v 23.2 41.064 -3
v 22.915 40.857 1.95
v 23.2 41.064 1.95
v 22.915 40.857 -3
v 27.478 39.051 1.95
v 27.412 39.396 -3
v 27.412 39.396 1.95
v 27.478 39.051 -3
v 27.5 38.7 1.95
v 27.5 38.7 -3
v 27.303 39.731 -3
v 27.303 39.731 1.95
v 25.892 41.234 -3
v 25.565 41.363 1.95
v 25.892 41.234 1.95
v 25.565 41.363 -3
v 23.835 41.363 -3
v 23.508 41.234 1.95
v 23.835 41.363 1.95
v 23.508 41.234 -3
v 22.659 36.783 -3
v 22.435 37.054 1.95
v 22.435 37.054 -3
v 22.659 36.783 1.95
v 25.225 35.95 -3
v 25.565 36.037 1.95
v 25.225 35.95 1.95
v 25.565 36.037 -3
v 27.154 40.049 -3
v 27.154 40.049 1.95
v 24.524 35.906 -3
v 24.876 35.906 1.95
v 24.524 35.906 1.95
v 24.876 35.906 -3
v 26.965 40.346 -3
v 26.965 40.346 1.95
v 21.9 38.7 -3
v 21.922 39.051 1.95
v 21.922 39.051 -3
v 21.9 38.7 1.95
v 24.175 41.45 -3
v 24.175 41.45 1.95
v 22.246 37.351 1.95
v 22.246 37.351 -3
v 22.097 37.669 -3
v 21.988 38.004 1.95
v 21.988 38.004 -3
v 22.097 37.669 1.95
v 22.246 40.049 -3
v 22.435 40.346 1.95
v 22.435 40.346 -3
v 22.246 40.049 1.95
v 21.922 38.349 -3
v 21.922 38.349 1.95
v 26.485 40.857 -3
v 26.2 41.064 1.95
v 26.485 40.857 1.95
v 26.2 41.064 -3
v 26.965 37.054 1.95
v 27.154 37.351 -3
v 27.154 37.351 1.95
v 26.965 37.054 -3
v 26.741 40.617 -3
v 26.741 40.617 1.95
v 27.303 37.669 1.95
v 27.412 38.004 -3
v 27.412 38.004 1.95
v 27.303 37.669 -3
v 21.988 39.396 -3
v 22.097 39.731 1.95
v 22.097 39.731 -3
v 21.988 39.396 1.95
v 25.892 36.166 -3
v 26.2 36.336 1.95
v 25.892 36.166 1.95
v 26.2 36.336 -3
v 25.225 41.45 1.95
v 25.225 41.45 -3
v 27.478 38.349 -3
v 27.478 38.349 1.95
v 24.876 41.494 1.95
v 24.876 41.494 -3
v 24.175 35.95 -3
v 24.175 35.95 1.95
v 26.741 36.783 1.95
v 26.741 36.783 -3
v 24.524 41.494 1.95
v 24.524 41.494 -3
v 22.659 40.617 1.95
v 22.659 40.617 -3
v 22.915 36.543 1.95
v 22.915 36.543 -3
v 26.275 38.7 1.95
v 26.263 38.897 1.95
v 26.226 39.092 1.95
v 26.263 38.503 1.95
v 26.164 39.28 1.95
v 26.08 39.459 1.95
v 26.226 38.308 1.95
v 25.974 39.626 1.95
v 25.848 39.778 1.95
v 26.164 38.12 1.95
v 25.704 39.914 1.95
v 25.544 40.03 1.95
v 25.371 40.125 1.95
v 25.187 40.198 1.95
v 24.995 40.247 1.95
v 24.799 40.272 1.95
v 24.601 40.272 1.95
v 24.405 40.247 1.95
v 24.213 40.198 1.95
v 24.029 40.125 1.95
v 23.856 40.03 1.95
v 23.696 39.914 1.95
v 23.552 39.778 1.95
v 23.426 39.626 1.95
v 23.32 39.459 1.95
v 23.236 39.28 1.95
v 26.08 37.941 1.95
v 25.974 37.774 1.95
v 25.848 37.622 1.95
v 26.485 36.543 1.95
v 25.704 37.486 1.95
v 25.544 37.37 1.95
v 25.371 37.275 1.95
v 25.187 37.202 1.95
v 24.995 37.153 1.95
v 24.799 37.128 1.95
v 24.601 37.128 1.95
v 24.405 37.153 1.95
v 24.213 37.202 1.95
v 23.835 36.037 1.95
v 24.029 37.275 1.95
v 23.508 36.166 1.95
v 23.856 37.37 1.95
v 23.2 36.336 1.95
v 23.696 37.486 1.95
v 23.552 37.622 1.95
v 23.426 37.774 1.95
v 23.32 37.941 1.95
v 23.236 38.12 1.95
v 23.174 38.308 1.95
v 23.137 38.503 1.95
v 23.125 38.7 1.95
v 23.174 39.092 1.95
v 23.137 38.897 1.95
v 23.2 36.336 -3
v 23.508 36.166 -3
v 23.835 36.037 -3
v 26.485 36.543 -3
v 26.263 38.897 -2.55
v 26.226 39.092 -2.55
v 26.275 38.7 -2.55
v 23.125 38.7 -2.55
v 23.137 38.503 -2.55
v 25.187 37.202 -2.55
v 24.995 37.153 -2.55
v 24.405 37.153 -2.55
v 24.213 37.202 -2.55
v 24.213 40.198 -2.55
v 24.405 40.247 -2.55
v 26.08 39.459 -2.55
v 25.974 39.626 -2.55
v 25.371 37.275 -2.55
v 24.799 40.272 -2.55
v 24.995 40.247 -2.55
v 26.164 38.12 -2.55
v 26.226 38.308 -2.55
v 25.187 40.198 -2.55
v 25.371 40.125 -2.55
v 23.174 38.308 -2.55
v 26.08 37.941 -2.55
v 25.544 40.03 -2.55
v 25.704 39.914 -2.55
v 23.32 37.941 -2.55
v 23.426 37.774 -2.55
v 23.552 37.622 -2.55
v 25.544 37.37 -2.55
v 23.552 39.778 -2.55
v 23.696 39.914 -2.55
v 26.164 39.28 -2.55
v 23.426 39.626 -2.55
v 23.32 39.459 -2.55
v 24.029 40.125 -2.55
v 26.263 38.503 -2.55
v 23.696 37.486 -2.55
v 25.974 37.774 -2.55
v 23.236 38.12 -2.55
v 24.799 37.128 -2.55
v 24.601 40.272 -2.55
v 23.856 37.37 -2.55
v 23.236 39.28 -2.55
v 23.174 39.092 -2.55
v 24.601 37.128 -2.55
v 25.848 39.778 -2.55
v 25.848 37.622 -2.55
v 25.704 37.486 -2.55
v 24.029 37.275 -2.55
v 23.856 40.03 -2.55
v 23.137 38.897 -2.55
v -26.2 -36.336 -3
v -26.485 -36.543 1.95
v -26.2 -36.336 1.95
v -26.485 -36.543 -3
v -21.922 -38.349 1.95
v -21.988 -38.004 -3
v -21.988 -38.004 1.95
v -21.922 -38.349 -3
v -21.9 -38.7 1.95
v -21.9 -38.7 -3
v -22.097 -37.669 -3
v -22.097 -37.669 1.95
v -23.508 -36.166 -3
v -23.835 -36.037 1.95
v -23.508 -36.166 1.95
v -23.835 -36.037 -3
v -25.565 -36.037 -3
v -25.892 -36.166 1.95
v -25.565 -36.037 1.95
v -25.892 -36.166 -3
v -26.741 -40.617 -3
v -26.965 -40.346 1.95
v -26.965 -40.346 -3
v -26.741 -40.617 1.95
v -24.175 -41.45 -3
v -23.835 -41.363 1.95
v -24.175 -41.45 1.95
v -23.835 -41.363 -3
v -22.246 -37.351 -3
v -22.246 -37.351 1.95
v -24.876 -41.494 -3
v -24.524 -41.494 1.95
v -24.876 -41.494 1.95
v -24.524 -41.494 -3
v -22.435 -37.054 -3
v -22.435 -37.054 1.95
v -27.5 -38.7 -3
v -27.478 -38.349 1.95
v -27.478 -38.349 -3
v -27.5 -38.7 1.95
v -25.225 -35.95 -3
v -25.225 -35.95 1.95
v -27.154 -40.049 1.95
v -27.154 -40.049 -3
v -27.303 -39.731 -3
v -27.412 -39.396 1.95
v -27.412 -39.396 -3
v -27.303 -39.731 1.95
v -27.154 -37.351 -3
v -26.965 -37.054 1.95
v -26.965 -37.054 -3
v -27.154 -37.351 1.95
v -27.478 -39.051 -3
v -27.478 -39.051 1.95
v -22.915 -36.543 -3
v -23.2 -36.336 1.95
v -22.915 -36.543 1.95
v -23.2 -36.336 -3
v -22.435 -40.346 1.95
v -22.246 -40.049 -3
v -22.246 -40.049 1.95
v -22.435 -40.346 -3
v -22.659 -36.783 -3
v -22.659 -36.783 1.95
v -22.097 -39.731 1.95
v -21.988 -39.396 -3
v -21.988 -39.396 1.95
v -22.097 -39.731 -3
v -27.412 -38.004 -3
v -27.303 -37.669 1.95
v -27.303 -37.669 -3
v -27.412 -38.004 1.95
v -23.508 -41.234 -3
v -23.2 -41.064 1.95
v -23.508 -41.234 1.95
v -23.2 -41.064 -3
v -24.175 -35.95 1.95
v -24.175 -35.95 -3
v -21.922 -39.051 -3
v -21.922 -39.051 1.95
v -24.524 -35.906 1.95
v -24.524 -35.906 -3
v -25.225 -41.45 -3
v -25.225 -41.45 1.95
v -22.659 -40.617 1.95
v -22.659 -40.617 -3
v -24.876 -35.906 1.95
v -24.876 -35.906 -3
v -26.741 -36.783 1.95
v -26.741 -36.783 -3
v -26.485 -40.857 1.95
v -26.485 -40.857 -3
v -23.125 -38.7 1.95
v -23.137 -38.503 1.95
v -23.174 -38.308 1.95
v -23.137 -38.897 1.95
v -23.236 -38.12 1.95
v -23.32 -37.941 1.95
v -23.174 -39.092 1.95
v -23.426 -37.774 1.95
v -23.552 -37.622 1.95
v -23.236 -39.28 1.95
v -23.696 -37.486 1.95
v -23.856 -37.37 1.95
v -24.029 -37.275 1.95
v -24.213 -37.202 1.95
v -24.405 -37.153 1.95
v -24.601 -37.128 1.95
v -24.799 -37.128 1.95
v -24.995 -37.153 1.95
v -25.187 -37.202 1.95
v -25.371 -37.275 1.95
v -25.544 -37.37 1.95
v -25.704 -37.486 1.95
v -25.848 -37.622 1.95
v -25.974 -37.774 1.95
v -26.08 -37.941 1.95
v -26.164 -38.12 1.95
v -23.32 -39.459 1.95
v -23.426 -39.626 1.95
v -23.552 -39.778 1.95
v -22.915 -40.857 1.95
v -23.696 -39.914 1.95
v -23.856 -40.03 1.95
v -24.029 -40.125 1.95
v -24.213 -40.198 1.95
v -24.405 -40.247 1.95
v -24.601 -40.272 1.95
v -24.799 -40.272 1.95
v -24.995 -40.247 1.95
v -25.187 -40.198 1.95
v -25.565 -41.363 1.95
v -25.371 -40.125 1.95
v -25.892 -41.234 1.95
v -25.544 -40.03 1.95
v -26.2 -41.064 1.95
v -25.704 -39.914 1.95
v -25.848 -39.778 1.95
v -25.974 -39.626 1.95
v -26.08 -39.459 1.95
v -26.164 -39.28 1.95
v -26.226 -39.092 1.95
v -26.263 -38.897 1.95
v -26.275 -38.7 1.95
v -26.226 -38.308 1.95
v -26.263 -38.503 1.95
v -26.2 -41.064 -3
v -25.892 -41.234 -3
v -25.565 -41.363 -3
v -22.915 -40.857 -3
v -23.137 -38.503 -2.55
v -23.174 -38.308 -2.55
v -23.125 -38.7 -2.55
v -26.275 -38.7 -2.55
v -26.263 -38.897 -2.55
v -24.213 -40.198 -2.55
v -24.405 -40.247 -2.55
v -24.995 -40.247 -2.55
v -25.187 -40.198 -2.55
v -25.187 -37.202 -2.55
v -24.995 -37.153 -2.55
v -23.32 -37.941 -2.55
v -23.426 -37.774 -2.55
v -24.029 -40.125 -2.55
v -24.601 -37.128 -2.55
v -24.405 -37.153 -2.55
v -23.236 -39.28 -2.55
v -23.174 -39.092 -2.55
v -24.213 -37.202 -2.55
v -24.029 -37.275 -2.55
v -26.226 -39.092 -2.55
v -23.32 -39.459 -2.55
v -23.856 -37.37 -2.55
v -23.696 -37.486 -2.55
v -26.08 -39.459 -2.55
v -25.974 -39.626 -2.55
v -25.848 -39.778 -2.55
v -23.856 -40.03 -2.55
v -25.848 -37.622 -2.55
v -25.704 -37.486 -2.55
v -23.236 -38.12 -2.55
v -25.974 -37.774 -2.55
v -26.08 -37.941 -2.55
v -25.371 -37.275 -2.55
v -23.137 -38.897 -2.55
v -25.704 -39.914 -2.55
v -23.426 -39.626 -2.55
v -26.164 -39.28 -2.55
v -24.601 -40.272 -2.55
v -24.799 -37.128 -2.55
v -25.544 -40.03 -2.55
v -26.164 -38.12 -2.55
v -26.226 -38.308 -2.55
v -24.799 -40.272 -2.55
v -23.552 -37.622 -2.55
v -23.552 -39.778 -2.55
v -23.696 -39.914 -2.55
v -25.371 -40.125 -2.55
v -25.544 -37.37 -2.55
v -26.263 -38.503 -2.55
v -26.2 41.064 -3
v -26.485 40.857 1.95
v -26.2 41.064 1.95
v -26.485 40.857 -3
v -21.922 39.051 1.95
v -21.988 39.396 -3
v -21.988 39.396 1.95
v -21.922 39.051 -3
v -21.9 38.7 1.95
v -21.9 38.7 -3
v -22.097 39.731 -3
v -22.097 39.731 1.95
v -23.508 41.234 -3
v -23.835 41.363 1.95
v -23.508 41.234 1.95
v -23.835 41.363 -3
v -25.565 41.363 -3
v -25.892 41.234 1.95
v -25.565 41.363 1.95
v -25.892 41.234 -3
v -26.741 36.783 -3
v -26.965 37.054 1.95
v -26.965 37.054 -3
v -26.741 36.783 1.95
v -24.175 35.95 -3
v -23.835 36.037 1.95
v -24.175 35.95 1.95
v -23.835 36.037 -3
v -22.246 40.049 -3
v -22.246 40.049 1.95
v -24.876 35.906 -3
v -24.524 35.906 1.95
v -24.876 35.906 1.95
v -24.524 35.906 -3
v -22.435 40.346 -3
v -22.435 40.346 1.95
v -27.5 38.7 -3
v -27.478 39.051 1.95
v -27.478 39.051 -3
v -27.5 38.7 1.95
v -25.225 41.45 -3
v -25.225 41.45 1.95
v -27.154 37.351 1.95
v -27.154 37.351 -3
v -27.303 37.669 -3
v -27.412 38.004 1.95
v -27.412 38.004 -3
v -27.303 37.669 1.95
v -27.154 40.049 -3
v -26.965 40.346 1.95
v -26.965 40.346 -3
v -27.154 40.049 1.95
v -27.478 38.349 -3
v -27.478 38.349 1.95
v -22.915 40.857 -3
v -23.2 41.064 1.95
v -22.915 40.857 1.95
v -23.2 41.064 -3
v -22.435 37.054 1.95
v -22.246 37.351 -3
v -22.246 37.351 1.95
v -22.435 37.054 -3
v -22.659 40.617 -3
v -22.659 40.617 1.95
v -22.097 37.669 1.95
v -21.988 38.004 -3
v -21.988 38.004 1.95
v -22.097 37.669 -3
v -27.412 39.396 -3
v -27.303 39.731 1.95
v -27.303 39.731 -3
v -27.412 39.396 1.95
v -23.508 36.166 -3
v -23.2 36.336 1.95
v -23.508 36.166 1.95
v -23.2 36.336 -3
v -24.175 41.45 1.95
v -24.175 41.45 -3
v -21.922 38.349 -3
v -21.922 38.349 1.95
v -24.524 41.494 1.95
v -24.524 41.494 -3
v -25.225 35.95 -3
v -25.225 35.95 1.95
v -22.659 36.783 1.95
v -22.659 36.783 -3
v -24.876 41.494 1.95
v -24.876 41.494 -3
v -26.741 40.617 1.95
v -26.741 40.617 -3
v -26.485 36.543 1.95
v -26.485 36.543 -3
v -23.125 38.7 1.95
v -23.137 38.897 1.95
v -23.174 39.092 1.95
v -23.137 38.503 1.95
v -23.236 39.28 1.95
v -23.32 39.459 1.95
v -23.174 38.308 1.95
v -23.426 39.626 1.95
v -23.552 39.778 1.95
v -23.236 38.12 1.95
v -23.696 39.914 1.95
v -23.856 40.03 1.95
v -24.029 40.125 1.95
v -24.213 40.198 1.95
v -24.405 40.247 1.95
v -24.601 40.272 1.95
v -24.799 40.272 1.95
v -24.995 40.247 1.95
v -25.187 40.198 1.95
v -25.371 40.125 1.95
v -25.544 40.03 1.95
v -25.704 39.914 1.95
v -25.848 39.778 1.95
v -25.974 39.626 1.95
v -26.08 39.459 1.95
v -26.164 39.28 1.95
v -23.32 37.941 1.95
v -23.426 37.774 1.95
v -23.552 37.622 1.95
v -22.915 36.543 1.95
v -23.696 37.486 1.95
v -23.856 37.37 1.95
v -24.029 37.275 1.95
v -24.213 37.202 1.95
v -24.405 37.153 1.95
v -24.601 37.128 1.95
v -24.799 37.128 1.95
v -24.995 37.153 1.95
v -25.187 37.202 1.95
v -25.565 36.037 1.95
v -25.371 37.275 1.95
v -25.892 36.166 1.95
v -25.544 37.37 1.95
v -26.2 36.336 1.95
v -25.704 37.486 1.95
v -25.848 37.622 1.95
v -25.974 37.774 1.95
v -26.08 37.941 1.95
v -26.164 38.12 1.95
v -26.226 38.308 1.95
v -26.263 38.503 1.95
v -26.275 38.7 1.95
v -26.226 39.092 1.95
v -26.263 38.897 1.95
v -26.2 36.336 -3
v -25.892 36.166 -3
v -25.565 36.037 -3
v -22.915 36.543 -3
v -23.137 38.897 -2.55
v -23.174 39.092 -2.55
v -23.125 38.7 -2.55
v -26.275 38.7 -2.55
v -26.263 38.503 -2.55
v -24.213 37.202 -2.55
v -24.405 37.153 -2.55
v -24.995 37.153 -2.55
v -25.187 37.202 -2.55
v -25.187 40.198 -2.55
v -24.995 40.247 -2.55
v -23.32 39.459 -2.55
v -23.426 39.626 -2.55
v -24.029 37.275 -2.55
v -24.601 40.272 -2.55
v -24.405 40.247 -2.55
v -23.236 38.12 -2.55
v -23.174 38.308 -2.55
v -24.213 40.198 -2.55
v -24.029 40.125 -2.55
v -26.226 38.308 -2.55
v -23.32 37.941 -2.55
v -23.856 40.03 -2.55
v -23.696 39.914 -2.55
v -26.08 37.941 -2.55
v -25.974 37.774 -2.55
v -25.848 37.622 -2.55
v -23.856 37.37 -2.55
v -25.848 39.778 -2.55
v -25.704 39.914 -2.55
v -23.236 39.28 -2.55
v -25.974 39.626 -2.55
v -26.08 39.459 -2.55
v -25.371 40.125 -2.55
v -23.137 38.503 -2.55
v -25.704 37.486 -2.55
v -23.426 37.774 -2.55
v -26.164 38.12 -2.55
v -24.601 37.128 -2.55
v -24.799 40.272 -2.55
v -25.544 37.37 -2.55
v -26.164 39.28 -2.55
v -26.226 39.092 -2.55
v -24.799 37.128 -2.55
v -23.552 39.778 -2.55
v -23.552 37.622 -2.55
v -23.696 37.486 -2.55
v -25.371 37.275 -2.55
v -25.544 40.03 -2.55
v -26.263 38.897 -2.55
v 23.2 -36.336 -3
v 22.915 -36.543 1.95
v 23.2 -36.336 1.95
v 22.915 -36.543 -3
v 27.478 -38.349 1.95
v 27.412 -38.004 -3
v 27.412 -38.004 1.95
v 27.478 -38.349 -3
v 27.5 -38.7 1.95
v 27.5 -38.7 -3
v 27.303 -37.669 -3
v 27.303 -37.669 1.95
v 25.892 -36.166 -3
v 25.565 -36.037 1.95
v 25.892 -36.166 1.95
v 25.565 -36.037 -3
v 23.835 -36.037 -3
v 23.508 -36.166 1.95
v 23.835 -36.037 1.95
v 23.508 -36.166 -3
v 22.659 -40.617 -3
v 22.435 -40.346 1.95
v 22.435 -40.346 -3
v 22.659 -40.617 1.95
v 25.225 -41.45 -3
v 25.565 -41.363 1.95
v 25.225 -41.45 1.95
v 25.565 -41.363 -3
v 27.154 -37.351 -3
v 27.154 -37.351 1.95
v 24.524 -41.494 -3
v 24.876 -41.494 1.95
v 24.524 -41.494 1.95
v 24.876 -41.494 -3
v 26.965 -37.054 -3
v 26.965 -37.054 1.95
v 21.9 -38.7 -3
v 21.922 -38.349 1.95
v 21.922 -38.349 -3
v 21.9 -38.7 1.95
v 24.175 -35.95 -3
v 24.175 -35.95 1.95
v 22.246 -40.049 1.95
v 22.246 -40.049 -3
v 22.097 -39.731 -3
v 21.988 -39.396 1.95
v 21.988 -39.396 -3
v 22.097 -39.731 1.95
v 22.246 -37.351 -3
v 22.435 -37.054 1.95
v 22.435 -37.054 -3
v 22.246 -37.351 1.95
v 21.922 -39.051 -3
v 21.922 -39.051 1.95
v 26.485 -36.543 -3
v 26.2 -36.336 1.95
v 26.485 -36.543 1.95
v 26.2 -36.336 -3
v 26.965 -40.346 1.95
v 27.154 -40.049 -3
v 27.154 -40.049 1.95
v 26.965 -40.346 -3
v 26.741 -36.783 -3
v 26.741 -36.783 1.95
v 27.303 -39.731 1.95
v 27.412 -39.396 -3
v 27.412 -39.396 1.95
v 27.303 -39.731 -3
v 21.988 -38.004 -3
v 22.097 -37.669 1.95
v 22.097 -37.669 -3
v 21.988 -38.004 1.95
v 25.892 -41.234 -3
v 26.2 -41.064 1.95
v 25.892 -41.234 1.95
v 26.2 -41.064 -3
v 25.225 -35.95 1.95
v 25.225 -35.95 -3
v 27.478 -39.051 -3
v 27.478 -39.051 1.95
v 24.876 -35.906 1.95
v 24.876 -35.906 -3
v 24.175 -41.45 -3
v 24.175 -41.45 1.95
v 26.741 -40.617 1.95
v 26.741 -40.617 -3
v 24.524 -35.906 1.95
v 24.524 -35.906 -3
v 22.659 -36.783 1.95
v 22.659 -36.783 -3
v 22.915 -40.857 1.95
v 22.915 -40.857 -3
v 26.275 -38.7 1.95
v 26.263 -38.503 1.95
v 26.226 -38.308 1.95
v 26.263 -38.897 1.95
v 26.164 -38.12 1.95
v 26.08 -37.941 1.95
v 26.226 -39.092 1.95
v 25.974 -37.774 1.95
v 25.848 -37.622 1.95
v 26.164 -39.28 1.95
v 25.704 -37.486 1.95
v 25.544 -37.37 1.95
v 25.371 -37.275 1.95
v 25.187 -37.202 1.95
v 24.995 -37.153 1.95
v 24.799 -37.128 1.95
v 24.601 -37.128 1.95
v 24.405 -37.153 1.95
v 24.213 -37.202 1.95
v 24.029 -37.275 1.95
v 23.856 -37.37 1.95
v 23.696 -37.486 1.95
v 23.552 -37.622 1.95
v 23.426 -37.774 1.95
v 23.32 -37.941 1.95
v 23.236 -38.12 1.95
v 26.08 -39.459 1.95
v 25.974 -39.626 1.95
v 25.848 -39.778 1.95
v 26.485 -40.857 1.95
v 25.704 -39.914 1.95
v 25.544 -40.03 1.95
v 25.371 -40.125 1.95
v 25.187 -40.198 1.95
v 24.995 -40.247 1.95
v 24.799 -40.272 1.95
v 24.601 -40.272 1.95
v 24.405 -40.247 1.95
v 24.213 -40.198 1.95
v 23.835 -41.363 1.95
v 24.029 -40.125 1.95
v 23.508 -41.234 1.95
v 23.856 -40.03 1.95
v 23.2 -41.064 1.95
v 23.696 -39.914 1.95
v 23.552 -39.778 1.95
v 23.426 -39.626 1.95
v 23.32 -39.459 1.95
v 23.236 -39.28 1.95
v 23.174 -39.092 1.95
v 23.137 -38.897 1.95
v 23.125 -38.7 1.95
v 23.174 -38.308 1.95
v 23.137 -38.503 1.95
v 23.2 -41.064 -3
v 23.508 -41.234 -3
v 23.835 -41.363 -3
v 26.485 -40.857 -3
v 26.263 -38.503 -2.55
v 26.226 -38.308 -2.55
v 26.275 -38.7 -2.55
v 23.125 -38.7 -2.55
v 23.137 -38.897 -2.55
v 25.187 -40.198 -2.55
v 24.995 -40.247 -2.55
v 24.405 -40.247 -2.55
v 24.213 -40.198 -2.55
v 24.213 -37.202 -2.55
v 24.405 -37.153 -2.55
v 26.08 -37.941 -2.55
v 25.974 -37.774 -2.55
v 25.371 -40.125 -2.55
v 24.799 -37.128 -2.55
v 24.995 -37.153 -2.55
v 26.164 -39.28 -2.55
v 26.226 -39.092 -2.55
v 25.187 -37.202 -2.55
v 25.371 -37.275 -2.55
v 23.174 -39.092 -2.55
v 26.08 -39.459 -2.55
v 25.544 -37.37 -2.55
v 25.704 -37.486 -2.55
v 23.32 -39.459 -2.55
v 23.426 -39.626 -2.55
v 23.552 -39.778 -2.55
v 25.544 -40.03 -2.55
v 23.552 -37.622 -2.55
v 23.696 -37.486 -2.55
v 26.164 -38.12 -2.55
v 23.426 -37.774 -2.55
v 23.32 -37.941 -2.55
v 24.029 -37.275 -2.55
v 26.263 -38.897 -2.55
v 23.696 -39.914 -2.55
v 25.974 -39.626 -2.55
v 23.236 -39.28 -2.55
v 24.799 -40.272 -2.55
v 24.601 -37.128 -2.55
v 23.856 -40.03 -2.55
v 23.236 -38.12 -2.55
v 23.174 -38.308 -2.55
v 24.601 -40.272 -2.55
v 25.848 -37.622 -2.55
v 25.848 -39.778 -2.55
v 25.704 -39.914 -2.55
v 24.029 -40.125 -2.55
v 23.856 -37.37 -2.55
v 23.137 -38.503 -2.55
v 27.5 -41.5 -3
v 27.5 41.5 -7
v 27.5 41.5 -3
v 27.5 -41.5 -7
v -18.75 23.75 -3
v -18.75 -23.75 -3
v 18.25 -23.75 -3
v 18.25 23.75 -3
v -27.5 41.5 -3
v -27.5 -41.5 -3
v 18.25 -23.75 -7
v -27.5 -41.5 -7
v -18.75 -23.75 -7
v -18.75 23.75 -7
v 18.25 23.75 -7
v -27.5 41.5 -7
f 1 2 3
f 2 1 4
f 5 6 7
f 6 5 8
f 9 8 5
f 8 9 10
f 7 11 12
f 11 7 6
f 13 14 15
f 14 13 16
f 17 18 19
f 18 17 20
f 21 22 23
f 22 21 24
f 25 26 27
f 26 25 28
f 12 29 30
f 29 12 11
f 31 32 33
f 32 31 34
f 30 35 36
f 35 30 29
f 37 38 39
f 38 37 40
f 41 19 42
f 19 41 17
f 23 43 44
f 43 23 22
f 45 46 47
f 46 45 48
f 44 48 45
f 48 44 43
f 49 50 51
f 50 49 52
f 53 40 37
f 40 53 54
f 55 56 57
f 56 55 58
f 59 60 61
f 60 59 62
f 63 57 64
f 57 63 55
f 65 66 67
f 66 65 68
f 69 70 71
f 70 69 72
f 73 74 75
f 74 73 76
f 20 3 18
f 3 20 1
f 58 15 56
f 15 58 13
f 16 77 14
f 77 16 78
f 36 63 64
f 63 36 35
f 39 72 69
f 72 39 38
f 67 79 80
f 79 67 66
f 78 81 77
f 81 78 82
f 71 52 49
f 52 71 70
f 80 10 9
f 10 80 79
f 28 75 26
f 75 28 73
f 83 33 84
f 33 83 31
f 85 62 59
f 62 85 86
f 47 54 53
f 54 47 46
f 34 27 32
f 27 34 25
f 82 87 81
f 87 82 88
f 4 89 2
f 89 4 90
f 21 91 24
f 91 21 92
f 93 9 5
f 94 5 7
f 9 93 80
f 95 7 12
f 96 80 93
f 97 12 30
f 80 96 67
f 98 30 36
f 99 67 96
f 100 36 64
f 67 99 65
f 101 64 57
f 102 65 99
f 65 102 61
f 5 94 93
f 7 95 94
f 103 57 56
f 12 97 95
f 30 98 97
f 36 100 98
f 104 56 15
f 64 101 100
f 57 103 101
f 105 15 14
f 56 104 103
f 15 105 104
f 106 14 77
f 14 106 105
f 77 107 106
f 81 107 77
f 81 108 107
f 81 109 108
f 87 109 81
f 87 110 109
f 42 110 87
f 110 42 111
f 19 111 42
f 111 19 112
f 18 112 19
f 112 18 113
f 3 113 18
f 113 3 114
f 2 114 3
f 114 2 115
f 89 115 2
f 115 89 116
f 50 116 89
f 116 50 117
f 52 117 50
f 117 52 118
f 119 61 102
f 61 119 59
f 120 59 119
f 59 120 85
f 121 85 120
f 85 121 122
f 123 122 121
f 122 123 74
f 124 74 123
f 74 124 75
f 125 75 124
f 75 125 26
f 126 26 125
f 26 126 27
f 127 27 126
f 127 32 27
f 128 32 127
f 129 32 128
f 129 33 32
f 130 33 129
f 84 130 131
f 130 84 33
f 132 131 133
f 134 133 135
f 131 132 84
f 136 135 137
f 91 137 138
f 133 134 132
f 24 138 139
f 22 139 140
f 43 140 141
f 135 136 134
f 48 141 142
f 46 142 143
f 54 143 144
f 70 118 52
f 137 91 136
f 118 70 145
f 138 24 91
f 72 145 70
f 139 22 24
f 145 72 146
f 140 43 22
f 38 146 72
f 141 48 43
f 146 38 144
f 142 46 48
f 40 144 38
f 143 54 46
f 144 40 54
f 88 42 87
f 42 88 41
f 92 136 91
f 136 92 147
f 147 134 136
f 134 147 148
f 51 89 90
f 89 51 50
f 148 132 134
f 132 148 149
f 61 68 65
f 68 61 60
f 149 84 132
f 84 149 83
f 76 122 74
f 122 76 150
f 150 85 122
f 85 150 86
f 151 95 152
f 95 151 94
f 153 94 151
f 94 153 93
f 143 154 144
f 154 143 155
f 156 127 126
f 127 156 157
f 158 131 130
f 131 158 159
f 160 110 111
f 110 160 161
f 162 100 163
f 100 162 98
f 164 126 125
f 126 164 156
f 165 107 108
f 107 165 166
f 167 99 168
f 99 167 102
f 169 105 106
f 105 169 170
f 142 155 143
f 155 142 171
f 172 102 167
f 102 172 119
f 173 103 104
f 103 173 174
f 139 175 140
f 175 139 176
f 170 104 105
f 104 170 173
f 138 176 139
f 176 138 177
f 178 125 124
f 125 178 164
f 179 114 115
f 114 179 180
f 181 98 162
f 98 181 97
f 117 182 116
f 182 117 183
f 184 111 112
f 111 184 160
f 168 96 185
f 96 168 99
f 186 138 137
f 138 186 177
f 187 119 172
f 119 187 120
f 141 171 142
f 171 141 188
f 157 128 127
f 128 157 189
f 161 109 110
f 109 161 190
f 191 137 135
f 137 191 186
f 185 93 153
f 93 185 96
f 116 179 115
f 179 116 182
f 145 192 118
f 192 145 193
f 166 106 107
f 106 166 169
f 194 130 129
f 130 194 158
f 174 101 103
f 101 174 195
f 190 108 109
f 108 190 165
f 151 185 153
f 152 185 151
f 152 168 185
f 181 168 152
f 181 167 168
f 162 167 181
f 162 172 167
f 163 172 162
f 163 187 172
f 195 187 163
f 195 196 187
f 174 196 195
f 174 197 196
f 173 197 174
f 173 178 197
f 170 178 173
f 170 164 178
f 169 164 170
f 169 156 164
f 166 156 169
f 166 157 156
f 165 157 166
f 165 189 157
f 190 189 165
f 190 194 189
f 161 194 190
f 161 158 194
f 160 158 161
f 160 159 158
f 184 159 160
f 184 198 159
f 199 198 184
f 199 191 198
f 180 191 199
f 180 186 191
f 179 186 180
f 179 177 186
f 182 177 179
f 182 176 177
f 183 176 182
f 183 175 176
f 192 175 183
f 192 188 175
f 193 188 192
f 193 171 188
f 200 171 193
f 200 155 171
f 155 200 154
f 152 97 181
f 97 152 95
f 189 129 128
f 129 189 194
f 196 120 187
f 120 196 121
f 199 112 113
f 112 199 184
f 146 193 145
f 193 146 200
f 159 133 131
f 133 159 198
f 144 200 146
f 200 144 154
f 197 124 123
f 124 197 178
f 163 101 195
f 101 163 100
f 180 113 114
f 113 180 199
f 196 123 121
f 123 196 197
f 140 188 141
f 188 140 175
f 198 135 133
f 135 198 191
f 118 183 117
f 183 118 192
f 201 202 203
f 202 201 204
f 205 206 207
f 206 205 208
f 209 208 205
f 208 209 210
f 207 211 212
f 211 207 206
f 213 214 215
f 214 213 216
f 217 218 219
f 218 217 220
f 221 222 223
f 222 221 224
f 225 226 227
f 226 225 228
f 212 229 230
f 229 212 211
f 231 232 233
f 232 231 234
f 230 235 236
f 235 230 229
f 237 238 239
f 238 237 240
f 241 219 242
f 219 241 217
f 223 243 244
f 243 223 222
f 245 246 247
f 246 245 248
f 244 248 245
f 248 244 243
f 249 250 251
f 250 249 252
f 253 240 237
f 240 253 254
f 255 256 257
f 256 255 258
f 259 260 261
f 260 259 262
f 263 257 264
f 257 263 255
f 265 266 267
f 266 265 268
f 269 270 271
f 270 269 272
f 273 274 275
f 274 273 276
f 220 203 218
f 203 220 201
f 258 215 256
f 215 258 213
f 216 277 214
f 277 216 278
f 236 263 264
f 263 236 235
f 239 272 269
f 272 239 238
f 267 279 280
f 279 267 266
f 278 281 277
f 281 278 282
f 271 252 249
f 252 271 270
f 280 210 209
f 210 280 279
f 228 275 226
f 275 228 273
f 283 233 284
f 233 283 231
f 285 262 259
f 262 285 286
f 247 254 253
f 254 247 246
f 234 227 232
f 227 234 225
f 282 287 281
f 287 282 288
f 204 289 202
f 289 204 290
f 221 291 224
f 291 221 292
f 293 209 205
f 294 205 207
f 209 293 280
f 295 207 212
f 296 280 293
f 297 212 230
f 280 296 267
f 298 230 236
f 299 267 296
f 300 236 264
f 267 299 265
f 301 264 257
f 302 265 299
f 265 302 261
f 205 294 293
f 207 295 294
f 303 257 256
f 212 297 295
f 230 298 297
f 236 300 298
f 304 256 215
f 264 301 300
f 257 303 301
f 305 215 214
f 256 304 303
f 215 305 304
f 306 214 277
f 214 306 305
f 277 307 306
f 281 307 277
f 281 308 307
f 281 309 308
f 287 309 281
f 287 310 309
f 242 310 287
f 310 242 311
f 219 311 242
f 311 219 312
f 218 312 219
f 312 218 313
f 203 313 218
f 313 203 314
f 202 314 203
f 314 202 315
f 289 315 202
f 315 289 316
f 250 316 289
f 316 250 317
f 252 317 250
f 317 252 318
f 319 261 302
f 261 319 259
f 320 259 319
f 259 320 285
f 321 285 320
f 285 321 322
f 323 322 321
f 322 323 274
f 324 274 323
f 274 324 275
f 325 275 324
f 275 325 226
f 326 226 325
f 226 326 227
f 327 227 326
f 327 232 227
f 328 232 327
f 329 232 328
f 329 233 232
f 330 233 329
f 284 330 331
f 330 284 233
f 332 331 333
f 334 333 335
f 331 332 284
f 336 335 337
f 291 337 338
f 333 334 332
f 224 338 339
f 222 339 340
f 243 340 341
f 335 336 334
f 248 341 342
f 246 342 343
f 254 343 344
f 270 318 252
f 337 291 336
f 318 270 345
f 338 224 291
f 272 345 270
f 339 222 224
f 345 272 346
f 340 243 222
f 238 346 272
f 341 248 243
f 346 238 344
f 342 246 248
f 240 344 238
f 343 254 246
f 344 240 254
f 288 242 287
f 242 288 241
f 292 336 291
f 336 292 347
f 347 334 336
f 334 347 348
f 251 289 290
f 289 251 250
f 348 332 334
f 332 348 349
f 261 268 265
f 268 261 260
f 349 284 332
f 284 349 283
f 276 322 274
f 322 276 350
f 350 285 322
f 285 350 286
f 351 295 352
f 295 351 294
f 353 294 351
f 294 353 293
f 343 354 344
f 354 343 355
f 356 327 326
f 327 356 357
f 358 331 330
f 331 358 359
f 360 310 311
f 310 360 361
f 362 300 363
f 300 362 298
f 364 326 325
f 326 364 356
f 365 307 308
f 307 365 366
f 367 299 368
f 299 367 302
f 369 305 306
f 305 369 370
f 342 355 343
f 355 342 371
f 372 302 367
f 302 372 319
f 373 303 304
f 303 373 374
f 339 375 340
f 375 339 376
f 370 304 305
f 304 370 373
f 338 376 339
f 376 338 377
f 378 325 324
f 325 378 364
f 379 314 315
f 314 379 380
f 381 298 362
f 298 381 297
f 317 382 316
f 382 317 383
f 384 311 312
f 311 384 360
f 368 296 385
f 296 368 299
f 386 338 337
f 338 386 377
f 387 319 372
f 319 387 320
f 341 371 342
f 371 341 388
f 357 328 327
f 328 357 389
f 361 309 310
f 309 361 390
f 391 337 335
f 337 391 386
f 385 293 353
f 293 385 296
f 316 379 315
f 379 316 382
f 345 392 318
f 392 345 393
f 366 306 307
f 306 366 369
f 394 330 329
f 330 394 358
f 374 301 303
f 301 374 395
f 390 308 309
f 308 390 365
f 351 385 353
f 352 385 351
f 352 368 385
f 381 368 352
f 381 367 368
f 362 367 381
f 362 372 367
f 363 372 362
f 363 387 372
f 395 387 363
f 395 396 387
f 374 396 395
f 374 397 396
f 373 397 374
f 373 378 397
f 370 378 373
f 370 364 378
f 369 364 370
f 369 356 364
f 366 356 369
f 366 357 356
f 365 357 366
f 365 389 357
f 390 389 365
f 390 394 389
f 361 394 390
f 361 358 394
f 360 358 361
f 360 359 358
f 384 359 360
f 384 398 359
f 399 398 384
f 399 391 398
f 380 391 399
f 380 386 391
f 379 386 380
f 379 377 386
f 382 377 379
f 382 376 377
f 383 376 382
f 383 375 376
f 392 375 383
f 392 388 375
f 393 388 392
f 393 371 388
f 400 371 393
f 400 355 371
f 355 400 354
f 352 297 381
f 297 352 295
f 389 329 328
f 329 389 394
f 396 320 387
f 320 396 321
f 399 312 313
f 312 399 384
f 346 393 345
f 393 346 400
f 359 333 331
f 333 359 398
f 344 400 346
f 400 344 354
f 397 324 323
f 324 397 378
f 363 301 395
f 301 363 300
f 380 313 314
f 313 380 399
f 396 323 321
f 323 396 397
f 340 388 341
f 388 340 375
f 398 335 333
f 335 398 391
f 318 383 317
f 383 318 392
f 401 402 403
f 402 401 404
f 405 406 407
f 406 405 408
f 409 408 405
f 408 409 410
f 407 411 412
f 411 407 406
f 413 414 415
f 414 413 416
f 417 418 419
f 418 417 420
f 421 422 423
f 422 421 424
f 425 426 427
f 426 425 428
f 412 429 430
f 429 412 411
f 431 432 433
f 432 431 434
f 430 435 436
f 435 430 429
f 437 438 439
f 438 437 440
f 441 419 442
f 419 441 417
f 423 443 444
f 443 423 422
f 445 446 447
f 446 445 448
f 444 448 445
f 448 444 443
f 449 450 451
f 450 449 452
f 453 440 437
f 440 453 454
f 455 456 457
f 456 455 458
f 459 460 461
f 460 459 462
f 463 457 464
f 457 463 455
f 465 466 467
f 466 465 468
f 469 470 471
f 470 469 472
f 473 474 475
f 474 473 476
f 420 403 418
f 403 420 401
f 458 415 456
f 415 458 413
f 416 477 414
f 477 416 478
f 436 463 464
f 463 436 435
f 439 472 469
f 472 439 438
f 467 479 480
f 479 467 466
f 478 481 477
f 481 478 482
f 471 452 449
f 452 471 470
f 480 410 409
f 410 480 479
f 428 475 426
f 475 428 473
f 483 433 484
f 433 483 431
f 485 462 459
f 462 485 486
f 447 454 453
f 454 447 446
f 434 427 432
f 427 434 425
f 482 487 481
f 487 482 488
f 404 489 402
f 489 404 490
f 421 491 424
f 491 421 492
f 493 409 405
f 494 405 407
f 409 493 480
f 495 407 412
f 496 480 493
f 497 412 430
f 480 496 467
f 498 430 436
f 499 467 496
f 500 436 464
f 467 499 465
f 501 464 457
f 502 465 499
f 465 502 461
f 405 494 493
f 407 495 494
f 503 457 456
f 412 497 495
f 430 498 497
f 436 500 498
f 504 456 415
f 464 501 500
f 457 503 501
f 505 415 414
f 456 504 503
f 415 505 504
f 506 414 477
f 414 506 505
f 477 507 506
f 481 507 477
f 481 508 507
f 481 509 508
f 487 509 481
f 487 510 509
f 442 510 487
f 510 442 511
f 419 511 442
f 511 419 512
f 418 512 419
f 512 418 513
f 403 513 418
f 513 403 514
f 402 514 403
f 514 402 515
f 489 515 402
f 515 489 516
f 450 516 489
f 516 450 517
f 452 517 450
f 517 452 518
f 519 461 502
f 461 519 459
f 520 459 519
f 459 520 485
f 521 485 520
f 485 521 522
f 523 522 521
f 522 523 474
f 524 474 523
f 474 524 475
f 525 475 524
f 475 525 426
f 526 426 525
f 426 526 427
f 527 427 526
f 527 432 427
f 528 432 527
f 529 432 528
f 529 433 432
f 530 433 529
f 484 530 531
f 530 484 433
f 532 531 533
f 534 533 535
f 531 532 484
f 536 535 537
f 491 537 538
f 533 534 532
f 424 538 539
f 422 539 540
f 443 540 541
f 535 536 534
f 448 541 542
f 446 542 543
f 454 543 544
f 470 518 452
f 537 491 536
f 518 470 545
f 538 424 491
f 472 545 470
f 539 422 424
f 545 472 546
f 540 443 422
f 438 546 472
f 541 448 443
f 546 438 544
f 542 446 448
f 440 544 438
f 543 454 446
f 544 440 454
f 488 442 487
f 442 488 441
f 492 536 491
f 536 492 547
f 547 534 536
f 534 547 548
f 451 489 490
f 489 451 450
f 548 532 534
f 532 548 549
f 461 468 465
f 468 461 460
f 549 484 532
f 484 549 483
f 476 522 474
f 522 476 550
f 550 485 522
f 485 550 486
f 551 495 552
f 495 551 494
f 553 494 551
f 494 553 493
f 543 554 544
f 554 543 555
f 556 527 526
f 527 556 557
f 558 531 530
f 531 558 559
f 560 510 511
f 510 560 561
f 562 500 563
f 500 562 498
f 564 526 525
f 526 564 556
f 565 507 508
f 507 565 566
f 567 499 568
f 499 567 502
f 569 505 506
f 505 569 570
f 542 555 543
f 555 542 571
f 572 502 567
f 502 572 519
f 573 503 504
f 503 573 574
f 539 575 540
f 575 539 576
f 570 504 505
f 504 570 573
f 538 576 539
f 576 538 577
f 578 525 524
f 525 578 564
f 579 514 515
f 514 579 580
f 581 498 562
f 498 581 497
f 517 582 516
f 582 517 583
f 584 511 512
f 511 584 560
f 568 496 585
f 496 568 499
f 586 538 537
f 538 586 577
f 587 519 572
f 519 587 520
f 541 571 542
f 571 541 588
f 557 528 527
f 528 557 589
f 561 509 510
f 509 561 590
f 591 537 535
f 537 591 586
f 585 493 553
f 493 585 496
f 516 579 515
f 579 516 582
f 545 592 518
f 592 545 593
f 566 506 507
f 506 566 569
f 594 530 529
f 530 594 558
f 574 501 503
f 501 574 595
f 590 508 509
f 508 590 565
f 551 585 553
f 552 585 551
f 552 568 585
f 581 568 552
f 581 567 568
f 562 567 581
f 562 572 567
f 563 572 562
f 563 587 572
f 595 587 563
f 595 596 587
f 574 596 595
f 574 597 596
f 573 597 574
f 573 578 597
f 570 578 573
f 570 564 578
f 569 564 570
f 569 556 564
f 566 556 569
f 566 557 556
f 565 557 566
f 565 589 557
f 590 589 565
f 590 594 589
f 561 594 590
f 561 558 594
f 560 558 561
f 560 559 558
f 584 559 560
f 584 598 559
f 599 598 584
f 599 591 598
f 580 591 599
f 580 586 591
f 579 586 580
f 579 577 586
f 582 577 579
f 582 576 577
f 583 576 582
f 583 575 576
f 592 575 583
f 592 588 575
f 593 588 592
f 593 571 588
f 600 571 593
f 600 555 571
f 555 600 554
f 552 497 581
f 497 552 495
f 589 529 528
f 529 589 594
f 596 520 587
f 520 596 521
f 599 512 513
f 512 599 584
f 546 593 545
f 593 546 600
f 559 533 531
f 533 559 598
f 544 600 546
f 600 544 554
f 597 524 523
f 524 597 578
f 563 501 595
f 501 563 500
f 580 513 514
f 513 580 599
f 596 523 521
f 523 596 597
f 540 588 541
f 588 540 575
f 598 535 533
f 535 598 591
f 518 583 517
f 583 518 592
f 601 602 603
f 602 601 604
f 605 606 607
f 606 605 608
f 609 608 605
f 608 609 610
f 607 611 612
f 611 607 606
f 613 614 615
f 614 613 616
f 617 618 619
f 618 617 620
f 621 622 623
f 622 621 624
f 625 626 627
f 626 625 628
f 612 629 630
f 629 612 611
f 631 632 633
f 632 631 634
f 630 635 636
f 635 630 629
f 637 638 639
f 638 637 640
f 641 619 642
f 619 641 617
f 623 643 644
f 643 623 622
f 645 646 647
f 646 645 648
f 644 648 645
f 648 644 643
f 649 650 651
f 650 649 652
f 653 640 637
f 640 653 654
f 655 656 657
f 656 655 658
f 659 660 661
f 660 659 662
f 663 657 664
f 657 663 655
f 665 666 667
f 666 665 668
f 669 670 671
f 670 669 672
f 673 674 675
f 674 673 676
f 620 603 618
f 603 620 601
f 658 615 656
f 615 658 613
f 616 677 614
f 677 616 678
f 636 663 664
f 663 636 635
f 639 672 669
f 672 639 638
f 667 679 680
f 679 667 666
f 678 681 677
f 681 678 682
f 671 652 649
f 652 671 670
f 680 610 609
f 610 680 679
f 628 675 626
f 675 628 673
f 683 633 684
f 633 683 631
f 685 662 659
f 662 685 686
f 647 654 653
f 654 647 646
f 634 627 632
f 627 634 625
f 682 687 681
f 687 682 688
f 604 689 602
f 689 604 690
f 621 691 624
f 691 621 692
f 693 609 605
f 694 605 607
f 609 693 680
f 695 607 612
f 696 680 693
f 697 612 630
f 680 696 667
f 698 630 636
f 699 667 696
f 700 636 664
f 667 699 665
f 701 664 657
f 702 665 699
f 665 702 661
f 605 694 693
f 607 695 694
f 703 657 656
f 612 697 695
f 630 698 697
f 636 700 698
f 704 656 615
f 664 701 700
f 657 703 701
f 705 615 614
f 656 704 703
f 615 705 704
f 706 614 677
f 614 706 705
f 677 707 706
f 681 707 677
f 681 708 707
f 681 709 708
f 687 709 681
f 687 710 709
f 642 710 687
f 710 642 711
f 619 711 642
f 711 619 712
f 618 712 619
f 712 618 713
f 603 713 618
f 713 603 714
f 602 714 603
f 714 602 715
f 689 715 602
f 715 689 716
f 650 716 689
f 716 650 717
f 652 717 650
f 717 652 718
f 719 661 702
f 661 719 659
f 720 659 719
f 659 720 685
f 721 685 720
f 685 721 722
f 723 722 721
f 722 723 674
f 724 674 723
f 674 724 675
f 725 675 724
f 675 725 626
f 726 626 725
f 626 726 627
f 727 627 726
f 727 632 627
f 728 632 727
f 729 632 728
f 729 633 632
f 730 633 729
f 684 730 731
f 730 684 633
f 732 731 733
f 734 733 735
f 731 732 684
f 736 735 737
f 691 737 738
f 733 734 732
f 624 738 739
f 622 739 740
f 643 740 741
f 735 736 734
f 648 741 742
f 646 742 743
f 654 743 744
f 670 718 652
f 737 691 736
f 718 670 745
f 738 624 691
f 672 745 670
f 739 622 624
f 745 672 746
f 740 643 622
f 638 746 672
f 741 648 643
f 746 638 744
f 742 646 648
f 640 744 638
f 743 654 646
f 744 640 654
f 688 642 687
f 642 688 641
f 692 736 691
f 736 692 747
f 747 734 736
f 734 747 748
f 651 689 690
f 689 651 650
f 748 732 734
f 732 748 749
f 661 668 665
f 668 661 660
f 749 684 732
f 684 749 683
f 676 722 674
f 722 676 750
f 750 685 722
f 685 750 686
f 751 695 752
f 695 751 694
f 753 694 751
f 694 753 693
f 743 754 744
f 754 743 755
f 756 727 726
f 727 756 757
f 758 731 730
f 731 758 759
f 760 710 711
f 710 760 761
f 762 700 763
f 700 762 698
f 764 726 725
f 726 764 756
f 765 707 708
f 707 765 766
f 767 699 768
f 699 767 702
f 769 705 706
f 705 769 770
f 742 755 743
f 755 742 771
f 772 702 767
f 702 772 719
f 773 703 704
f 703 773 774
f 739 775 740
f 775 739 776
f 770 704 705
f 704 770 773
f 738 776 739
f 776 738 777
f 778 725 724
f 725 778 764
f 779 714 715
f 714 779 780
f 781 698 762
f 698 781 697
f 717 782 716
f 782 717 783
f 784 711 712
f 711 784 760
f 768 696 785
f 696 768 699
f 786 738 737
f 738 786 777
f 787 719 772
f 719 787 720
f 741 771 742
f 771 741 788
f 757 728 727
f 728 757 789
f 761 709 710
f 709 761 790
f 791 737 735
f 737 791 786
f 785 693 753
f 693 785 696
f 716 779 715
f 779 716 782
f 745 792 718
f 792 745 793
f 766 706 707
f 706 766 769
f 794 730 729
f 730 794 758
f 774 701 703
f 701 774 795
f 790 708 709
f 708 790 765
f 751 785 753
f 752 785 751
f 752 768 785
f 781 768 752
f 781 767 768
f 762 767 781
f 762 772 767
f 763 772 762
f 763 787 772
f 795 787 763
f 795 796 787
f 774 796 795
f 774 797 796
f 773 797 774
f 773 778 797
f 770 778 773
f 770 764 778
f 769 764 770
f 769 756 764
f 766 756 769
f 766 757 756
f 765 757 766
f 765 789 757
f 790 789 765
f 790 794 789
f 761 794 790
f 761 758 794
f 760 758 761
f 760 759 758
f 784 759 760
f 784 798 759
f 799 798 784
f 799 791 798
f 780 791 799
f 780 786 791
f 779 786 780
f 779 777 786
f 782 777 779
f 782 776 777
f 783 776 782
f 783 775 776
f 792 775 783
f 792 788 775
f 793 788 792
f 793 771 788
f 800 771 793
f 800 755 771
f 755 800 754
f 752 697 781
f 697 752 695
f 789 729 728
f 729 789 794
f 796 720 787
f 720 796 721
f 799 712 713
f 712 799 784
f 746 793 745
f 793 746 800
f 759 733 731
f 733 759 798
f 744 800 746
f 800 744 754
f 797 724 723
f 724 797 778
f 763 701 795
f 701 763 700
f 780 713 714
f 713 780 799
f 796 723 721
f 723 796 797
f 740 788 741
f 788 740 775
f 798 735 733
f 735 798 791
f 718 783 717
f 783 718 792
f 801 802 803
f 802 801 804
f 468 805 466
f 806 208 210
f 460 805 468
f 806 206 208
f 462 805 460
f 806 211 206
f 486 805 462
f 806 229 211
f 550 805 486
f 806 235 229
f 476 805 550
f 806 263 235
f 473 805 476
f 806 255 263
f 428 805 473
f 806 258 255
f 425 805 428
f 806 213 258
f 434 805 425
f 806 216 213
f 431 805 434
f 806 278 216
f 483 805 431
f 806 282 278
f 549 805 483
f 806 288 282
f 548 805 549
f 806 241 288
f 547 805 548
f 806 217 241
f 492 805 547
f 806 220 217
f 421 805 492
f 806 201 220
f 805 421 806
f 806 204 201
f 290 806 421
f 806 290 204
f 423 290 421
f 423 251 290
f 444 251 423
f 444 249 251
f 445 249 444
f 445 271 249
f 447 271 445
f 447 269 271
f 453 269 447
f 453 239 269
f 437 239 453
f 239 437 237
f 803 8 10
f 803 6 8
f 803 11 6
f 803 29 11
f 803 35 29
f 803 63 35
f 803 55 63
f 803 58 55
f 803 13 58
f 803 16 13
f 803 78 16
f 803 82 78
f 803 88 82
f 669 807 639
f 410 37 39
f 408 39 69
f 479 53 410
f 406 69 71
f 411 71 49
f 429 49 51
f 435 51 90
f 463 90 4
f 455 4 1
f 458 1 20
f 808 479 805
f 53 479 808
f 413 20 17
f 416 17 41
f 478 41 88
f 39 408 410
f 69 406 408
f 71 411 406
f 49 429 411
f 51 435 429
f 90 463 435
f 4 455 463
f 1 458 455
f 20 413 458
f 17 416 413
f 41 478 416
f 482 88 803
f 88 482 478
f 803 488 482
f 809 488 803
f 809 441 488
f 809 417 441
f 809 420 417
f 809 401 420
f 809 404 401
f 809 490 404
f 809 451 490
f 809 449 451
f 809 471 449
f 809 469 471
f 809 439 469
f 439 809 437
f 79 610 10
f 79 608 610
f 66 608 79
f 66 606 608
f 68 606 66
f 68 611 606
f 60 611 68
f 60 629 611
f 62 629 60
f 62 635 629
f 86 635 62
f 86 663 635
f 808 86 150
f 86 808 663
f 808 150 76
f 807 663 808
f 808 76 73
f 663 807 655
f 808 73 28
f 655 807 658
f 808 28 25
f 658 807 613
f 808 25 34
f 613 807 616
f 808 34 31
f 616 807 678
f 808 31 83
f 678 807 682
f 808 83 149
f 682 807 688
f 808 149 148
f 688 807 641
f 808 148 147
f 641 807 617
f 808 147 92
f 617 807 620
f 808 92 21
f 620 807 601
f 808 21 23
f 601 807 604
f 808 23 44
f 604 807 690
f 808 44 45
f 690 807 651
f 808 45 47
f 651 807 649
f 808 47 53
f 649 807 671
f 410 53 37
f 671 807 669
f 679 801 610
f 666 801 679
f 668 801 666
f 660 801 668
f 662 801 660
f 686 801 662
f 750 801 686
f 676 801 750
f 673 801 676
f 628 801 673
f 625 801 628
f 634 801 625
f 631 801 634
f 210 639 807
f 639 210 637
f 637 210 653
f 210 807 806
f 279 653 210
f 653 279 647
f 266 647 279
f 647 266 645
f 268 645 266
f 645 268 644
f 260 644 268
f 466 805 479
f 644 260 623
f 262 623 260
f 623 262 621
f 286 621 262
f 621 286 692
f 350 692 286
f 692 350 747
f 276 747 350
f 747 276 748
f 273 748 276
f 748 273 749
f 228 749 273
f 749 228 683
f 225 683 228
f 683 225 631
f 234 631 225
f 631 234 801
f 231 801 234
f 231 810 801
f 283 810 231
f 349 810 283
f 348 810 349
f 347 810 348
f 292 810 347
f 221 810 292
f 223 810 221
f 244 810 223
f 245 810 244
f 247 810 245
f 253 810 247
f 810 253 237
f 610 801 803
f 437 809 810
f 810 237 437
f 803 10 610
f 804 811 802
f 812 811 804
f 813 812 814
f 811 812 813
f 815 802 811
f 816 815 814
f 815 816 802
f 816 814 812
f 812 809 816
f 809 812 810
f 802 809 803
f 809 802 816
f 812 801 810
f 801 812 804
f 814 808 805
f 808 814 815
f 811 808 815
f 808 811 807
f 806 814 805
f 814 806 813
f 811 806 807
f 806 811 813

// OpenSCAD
// file: ../robot_settings.scad
main_box_x = 95; // 96
main_box_y = 102;
main_box_z = 74; // 74.5
wall_thickness = 2;

rail_gap = 2;
rail_inset = 7;

rail_thickness = 7;
rail_length = 250;
rail_width = 200;

raspberry_pi_screw_seperation_y = 57;
raspberry_pi_screw_seperation_z = 48;
raspberry_pi_peg_h = 5;

gears_module = 1;
pinion_gear_teeth = 30;
pinion_gear_width = 5;
pinion_gear_bore = 4;

gears_setback_distance = 25;
gear_post_height = 2 * pinion_gear_width + rail_thickness + 8 ;

steering_motor_mount_x = 45;
steering_motor_mount_y = 36;
steering_motor_mount_z = 18;
steering_motor_mount_setback_distance = gears_setback_distance + 16;

dc_motor_drivertype = "Teyleten"; // Teyleten
isAdafruit = (dc_motor_drivertype == "Adafruit");

drv8871_x = isAdafruit ? 20.3 : 21.6;
drv8871_y = isAdafruit ?  24 : 25;

drv8871_z = 2;
drv8871_screw_d = 2.5;
drv8871_solder_points_z = 2;

drv8871mount_edge_x = 1.5;
drv8871mount_edge_wall = 3;
drv8871mount_z = 5;
drv8871mount_x = drv8871_x +  drv8871mount_edge_wall - 2* drv8871mount_edge_x;
drv8871mount_y = 19;

drv8871_screw_distance = 15.64;
drv8871_solder_points_d = 1.66;
drv8871_solder_offset_y = 4.4;
drv8871_solder_inner_points_distance = 5;
drv8871_solder_outer_points_distance = 12;

dc_motor_housing_minus_encoder_z = 48;
dc_motor_encoder_z = 9.33;
dc_motor_encoder_wheel_d = 13.4;
dc_motor_encoder_wheel_thickness = 5;
dc_motor_encoder_wheel_gap = 3;
dc_motor_encoder_circuit_thickness = 2;
dc_motor_cutout_d = 24.8;
dc_motor_cutout_z = 19.5;

dc_motor_screw_head_z = 2;
dc_motor_screw_head_d = 5.6;
dc_motor_screw_d = 3.2;
dc_motor_screw_offset = 8.5;

dc_motor_axle_ring_z = 3;
dc_motor_axle_ring_d = 7.2;
dc_motor_axle_cutout_d = 4.5;
dc_motor_axle_cutout_z = 10;
dc_motor_axle_notch_cutout = 0.4;
dc_motor_axle_notch_cutout_z = 6;

pdmount_x = 20;
pdmount_y = 30;
pdmount_z = 2;
pdmount_edge_x = 1.5;
pdmount_edge_wall = 3;

steering_shaft_z = 45;
steering_shaft_d = 7;
steering_shaft_motor_fitting_d = 9;
coupler_length = 24.6;
coupler_diameter = 14;
coupler_screw_d = 4;
coupler_screw_z_offset = 5;
coupler_gear_side_insert = 12.6;
steering_shaft_with_coupler_z = steering_shaft_z - coupler_gear_side_insert;

lidar_mount_y = 110;
lidar_mount_x = 65 + 20;
lidar_narrow_screws = 40;
lidar_wide_screws = 56;
lidar_front_to_back_screws = 70;
lidar_screw_d = 3;
lidar_circuitboard_x = 20;
lidar_circuitboard_y = 35;
lidar_circuitboard_z = 1.2;
lidar_cord_length = 29;

ball_bearing_height = 7;
ball_bearing_outer_diameter = 22;
ball_bearing_inner_diameter = 8;

 armature_holder_height = 20;
 armature_holder_thickness = 8;
pull_bar_peg_r = 3.2;
apparatus_locking_peg_d = 4;

rack_module = 1;
rack_length = main_box_x / 2;
rack_height = 10;
rack_width = 10;
rack_teeth = 30;
rack_bore = 3;

pull_bar_length = rail_width / 2 - rack_length + 1;

// tire hardware
axle_length = 30;
axle_reciever_inner_diameter = 7.75;
axle_reciever_length = 18.8;
axle_notch_length = 7;
axle_notch_cutout = 2.4;

// power distribution bar
power_bar_cutout_x = 96;
power_bar_y = 19.1;
power_bar_z = 1.5;
power_bar_screw_distance = 91.4;
power_bar_screw_d = 2.8;
power_bar_standoff_z = 5;
power_bar_standoff_d = 6.83;

// breadboard
breadboard_wall_thickness = 3;
breadboard_width = 55;
breadboard_length = 83;
breadboard_height = 10.5;
breadboard_notch_width = 4.2;
breadboard_longside_notch_separation = 58.2 - breadboard_notch_width / 2;
breadboard_shortside_notch_separation = 26.3 - breadboard_notch_width;

pico_expander_width = 63;
pico_expander_height = 57;
pico_screw_hole_offset = 3;
pico_screw_hole_d = 2.5;

usbhub_thickness = 11.7;
usbhub_depth = 37.5;
usbhub_width = 86.7;
usbhub_end_port_width = 14.8;
usbhub_front_face_safe_zone_left = 10;
usbhub_front_face_safe_zone_right = 14.8;

switch_w = 16;
switch_cutout_d = 12.2;
switch_bump_h = 2;
switch_bump_l = 18.2;
// main file
   include <../robot_settings.scad>
   $fn = 50;
   
    module breadboard_pegs(show_platform = true)
    {
      peg_size = .35;
      
       // pegs for battery_box
       translate([0, 0, -.55])
       {
       translate([breadboard_width / 2 -power_bar_screw_d, breadboard_length / 2 - power_bar_screw_d, 0])
         {
            difference() {
              color("blue")
               cylinder(h = raspberry_pi_peg_h, d = 2 * power_bar_screw_d,  center = true);
               translate([0, 0, raspberry_pi_peg_h - raspberry_pi_peg_h + 1])
                 cylinder(h = raspberry_pi_peg_h + 1, d =  power_bar_screw_d + peg_size,  center = true);
            }
         }

     translate([-breadboard_width / 2 + power_bar_screw_d, -breadboard_length / 2 + power_bar_screw_d, 0])
         {
            difference() {
               cylinder(h = raspberry_pi_peg_h, d = 2 * power_bar_screw_d,  center = true);
               translate([0, 0, raspberry_pi_peg_h - raspberry_pi_peg_h + 1])
                 cylinder(h = raspberry_pi_peg_h + 1, d =  power_bar_screw_d  + peg_size,  center = true);
            }
         }

     translate([-breadboard_width / 2 + power_bar_screw_d, breadboard_length / 2 - power_bar_screw_d, 0])
         {
            difference() {
               cylinder(h = raspberry_pi_peg_h, d = 2 * power_bar_screw_d,  center = true);
               translate([0, 0, raspberry_pi_peg_h - raspberry_pi_peg_h + 1])
                 cylinder(h = raspberry_pi_peg_h + 1, d =  power_bar_screw_d + peg_size,  center = true);
            }
         }

     translate([breadboard_width / 2 - power_bar_screw_d, -breadboard_length / 2 + power_bar_screw_d, 0])
     {
         difference() {
             cylinder(h = raspberry_pi_peg_h, d = 2 * power_bar_screw_d,  center = true);
             translate([0, 0, raspberry_pi_peg_h - raspberry_pi_peg_h + 1])
               cylinder(h = raspberry_pi_peg_h + 1, d =  power_bar_screw_d + peg_size,  center = true);
             //translate([1, -power_bar_screw_d / 2, -2.8])
             //cube([power_bar_screw_d, power_bar_screw_d, 10]);
          }

        }     
    }
    
    if (show_platform)
    {
      difference() {
        translate([0, 0, -raspberry_pi_peg_h])
        cube([breadboard_width, breadboard_length, 4], center = true);
        
        // back window
        translate([-main_box_x / 4 + 5, -main_box_x / 4, -9])
       rotate([90, 0, 90])
        cube([main_box_x / 2, 4 * wall_thickness, main_box_z / 2]); 
       }
    }
}
breadboard_pegs();
